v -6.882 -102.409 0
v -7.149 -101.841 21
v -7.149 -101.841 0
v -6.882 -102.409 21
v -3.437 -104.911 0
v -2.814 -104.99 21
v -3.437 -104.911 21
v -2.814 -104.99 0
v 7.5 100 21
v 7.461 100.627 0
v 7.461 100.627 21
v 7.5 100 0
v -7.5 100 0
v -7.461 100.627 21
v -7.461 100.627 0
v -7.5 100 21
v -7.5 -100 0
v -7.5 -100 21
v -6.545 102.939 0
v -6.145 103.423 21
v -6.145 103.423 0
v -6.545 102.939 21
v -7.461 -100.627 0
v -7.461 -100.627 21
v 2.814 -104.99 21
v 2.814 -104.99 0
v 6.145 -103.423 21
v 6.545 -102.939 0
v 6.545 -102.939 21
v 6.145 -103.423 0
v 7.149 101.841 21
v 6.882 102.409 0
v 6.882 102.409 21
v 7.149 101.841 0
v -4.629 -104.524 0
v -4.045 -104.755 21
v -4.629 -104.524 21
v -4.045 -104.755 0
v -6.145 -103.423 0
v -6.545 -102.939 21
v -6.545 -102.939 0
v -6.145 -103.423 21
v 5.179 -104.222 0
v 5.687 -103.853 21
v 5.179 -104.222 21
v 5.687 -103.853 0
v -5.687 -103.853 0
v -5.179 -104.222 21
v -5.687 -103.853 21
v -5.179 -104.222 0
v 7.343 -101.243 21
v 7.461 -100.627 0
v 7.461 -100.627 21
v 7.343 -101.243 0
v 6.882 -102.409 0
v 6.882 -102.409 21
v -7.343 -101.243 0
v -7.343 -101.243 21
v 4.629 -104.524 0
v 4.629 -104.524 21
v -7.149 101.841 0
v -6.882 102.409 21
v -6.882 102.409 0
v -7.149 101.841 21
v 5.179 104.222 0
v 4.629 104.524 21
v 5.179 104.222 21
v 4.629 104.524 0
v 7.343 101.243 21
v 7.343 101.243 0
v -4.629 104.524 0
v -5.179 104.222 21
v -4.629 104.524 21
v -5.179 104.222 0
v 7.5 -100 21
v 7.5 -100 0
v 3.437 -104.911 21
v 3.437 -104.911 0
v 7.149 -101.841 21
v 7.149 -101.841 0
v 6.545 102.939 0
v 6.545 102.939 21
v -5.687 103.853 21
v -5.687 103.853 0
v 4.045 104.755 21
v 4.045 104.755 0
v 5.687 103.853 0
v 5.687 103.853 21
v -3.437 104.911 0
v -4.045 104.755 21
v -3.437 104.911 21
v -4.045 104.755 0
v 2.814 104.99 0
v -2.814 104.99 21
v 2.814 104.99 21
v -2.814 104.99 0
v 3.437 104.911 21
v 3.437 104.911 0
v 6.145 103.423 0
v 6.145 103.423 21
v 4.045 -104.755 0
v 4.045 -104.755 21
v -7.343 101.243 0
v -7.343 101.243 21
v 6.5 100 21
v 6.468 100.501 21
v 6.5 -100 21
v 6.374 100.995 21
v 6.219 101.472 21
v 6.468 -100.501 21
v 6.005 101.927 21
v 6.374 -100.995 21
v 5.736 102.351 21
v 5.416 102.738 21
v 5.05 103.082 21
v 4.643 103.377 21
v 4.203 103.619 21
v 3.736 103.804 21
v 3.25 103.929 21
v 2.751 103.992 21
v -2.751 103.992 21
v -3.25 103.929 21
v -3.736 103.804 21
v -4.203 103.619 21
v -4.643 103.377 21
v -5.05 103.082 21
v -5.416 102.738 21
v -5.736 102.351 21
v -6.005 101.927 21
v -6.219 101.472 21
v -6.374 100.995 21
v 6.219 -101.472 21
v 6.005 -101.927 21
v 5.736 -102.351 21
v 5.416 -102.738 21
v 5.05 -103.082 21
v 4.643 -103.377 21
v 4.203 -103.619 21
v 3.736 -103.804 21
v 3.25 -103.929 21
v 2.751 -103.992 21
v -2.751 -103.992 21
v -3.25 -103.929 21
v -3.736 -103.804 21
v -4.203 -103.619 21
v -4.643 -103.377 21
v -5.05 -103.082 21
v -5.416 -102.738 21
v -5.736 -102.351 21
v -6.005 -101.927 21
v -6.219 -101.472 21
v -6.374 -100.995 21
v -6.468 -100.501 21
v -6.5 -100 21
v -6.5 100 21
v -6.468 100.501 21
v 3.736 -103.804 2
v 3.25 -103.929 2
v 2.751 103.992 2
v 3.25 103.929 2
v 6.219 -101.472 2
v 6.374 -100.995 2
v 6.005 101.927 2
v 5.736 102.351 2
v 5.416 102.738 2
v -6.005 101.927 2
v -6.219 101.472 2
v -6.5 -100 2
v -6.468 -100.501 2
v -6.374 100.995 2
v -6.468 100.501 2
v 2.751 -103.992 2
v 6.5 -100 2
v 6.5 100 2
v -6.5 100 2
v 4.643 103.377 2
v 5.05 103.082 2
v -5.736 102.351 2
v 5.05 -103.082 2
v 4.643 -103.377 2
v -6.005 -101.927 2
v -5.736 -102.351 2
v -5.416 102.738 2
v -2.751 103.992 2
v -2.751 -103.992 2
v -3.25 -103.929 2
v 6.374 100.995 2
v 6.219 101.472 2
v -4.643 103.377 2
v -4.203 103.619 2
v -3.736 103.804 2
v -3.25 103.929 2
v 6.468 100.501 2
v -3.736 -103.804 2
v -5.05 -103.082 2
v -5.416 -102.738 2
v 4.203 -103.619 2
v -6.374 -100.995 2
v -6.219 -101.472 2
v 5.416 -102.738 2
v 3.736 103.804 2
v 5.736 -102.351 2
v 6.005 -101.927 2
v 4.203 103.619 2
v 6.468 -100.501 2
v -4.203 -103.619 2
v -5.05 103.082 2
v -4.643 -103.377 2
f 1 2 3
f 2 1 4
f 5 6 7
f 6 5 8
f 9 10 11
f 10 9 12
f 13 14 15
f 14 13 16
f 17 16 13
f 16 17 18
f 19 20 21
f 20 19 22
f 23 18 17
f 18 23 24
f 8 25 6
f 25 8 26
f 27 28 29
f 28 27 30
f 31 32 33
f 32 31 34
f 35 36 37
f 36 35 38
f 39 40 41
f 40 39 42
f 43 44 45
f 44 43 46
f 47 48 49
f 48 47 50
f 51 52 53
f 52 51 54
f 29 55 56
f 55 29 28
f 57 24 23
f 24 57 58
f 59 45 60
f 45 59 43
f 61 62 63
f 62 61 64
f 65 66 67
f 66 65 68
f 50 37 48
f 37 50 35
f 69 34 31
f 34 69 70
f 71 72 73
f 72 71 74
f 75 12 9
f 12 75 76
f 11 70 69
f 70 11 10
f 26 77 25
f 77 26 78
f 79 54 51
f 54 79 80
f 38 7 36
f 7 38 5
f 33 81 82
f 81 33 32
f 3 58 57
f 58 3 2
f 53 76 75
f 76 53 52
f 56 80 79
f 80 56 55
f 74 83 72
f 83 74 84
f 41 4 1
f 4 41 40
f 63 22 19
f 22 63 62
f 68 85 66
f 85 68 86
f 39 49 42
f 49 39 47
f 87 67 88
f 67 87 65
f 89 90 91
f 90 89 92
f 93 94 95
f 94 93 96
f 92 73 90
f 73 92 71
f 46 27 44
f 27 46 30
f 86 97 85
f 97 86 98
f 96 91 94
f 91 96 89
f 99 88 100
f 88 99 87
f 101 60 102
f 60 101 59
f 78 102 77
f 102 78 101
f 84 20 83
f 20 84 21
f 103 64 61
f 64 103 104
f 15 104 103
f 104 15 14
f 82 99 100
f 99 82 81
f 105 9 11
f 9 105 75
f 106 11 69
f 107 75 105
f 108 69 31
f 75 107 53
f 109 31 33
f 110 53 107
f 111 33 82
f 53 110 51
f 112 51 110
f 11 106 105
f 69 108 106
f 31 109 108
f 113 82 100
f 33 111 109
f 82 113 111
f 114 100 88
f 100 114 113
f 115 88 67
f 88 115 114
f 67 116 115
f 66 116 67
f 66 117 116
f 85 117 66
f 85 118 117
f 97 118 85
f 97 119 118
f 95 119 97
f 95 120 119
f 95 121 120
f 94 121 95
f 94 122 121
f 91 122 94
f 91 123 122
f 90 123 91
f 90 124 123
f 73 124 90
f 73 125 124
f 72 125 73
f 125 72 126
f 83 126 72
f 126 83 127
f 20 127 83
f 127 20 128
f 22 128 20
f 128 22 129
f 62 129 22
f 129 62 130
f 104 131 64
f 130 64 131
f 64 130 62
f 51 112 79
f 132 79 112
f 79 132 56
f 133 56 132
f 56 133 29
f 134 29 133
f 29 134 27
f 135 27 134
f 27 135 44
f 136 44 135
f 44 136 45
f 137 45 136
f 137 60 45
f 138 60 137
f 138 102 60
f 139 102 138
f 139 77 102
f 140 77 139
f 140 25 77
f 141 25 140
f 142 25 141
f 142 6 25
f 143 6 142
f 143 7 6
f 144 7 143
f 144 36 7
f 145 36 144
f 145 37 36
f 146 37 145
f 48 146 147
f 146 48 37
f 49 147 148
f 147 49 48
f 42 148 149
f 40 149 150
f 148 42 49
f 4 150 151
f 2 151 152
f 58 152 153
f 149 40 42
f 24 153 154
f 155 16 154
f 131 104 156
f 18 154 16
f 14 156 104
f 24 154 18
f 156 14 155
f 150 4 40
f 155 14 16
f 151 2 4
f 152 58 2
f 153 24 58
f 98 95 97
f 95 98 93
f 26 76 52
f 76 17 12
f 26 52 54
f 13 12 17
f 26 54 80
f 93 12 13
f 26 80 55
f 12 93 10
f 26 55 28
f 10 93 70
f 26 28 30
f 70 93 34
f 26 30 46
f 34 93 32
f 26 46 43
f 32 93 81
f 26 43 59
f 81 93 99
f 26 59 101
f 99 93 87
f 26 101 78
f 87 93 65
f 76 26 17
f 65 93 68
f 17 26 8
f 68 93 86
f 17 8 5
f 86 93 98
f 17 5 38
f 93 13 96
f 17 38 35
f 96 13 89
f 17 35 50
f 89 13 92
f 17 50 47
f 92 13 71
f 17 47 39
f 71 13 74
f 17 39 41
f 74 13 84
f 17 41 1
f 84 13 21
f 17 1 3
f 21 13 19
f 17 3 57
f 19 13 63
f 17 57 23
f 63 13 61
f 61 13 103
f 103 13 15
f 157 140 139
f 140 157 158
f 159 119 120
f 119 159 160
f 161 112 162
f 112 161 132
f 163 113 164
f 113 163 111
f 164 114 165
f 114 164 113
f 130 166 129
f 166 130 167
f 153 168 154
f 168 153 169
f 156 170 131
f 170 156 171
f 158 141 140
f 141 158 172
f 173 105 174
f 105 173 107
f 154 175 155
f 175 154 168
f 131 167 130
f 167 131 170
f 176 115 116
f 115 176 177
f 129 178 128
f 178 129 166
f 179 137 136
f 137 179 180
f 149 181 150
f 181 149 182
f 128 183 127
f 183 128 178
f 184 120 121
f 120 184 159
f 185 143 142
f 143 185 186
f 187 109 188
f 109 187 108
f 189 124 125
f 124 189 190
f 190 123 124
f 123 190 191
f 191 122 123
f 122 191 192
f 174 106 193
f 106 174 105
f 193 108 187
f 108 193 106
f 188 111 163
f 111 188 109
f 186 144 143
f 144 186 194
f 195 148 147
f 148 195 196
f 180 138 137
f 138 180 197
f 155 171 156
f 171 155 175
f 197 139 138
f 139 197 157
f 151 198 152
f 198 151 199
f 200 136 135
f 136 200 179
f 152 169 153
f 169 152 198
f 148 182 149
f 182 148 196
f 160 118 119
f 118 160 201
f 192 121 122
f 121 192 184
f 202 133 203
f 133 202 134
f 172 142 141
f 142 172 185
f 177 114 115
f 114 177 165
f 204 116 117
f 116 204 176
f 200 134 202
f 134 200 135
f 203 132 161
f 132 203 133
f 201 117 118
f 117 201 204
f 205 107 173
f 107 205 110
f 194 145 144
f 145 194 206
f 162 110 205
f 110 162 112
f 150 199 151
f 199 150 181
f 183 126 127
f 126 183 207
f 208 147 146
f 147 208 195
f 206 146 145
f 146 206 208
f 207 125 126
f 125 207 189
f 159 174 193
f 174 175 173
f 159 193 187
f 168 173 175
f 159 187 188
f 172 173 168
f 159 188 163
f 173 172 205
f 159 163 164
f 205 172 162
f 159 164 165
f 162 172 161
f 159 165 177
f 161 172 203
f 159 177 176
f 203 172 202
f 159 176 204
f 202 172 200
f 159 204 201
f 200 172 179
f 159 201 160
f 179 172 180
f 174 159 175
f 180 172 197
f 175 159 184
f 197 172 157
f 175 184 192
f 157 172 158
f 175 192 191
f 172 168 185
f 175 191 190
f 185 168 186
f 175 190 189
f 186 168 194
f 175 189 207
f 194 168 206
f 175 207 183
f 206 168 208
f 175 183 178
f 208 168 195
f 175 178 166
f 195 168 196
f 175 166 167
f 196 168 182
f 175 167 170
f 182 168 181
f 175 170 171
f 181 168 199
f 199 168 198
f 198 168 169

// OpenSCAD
$fn = 50;


difference() {
	union() {
		hull() {
			translate(v = [-2.5000000000, 100.0000000000, 0]) {
				cylinder(h = 21, r = 5);
			}
			translate(v = [2.5000000000, 100.0000000000, 0]) {
				cylinder(h = 21, r = 5);
			}
			translate(v = [-2.5000000000, -100.0000000000, 0]) {
				cylinder(h = 21, r = 5);
			}
			translate(v = [2.5000000000, -100.0000000000, 0]) {
				cylinder(h = 21, r = 5);
			}
		}
	}
	union() {
		translate(v = [0, 0, 2]) {
			hull() {
				translate(v = [-2.5000000000, 100.0000000000, 0]) {
					cylinder(h = 19, r = 4);
				}
				translate(v = [2.5000000000, 100.0000000000, 0]) {
					cylinder(h = 19, r = 4);
				}
				translate(v = [-2.5000000000, -100.0000000000, 0]) {
					cylinder(h = 19, r = 4);
				}
				translate(v = [2.5000000000, -100.0000000000, 0]) {
					cylinder(h = 19, r = 4);
				}
			}
		}
	}
}
